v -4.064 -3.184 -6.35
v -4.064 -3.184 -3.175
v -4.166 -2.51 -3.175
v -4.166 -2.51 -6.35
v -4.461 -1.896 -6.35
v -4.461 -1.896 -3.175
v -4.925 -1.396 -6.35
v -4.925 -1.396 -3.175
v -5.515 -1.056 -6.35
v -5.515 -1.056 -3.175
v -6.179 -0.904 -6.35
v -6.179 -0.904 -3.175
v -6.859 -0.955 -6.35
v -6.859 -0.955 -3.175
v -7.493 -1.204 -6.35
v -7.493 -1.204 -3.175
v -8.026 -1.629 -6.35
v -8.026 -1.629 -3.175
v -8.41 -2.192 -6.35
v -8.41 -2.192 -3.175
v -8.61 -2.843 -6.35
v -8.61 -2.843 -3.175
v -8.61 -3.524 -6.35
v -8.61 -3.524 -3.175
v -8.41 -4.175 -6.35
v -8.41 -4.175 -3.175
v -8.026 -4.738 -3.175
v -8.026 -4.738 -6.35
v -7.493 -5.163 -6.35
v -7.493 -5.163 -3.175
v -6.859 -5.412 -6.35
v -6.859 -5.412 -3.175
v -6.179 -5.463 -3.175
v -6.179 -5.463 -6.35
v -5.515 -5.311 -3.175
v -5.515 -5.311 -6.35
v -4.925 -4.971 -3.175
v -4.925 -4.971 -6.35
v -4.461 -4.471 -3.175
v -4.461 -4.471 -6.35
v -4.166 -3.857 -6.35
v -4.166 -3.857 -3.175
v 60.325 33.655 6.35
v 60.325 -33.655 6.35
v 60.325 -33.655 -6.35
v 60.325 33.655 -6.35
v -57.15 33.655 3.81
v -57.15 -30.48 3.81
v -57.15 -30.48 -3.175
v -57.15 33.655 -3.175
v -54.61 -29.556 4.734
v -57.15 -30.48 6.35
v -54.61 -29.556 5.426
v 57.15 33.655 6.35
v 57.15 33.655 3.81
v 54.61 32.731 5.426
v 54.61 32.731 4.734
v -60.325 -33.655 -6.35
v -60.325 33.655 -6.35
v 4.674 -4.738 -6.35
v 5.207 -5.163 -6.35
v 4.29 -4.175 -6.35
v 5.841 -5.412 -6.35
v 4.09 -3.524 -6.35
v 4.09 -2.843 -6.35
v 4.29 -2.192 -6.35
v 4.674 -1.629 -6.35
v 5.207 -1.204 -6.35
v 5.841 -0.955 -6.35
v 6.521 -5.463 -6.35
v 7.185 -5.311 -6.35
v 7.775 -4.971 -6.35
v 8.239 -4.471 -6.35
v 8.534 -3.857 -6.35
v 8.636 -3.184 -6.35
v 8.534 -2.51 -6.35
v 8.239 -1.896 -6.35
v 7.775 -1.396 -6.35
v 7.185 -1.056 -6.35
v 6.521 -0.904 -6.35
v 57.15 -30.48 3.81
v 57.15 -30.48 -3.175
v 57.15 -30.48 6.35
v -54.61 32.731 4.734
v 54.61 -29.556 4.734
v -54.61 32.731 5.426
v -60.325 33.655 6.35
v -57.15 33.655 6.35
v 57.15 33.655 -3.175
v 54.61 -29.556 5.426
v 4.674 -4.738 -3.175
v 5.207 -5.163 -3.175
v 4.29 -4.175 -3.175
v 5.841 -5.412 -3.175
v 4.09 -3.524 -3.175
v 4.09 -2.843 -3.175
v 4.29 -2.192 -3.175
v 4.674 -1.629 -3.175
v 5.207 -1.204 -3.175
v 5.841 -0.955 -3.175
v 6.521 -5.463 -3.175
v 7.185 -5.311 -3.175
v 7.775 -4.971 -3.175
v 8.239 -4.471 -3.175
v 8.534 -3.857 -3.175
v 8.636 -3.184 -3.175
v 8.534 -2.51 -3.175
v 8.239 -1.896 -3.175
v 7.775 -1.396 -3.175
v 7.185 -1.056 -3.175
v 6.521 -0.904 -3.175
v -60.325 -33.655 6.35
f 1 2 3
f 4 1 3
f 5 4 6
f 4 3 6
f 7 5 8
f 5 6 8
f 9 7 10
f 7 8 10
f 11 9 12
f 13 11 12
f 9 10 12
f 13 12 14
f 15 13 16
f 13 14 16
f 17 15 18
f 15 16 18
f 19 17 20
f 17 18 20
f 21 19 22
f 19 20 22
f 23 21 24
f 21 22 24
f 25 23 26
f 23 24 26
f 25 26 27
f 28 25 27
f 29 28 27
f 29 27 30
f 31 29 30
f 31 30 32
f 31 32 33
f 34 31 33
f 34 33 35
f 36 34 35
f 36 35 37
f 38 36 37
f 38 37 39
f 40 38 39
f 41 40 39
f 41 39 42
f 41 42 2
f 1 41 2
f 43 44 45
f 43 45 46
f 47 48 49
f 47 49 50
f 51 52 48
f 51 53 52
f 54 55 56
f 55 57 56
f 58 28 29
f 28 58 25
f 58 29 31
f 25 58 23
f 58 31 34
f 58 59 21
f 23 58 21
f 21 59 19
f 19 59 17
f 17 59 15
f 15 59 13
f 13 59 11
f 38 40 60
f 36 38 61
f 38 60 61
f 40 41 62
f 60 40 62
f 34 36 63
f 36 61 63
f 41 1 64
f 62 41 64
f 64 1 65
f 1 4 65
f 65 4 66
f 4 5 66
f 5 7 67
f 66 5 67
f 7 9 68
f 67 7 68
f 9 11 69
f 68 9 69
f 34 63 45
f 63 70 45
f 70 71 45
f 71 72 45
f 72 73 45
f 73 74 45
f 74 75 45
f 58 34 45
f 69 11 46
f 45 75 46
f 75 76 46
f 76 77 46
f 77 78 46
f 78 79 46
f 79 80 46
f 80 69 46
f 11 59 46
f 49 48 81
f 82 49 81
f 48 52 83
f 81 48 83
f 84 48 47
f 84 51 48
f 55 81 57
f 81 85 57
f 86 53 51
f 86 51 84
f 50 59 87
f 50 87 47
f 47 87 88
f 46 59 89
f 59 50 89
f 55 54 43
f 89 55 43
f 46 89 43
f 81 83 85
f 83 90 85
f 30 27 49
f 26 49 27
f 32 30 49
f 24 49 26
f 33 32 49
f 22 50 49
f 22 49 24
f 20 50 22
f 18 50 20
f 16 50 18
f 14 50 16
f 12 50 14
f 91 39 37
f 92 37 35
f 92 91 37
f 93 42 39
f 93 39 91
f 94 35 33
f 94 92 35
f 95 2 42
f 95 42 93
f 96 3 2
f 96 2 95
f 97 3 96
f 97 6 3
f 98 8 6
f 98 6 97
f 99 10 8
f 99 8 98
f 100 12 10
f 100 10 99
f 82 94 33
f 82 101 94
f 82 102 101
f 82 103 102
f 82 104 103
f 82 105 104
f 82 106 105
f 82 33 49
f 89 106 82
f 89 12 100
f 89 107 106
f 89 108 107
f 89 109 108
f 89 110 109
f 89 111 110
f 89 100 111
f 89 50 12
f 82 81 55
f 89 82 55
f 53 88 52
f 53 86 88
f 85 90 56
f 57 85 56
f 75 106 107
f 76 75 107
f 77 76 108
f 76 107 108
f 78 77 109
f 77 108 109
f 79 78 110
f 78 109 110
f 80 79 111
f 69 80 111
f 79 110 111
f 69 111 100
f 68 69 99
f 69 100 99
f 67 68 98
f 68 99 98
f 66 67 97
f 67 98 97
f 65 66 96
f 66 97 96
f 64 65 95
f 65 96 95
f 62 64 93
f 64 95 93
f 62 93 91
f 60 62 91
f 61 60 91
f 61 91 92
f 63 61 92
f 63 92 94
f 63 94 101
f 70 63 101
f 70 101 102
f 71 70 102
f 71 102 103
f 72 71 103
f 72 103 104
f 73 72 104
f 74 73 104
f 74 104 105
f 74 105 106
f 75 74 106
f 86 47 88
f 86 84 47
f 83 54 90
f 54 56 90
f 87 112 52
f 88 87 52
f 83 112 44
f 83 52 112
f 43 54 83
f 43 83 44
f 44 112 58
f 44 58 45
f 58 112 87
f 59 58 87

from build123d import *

# Parameters (mm, degrees)
F0_W     = 120.65
F0_H     = 67.31
F1_DEPTH = 6.35
F2_T     = -3.175
F3_W     = 64.135
F3_H     = 2.54
F4_DEPTH = 2.54
F4_TAPER = 20
F6_R     = 2.286
F7_DEPTH = 25.4


with BuildPart() as f1:
    # F0 (on Top) → F1 (new body, symmetric)
    with BuildSketch(Plane.XY):
        Rectangle(F0_W, F0_H)
    extrude(amount=F1_DEPTH, both=True)

    # F2
    f2_openings = [f1.faces().sort_by_distance(p)[0] for p in [
        (0, 0, 6.35),
        (0, 33.655, 0),
    ]]
    offset(amount=F2_T, openings=f2_openings)

    # F3 (on face) → F4 (join)
    with BuildSketch(Plane.YZ.offset(-57.15)):
        with Locations((1.5875, 5.08)):
            Rectangle(F3_W, F3_H)
    extrude(amount=F4_DEPTH, taper=F4_TAPER)

    # F5: F1 across plane


with BuildPart() as f1_1:
    add(f1.part)
    add(f1.part.mirror(Plane.YZ))

    # F6 (on face) → F7 (cut)
    with BuildSketch(Plane.XY.offset(-3.175)):
        with Locations((-6.35, -3.1835122595)):
            Circle(F6_R)
        with Locations((6.35, -3.1835122595)):
            Circle(F6_R)
    extrude(amount=-F7_DEPTH, mode=Mode.SUBTRACT)


solid = f1_1.part
